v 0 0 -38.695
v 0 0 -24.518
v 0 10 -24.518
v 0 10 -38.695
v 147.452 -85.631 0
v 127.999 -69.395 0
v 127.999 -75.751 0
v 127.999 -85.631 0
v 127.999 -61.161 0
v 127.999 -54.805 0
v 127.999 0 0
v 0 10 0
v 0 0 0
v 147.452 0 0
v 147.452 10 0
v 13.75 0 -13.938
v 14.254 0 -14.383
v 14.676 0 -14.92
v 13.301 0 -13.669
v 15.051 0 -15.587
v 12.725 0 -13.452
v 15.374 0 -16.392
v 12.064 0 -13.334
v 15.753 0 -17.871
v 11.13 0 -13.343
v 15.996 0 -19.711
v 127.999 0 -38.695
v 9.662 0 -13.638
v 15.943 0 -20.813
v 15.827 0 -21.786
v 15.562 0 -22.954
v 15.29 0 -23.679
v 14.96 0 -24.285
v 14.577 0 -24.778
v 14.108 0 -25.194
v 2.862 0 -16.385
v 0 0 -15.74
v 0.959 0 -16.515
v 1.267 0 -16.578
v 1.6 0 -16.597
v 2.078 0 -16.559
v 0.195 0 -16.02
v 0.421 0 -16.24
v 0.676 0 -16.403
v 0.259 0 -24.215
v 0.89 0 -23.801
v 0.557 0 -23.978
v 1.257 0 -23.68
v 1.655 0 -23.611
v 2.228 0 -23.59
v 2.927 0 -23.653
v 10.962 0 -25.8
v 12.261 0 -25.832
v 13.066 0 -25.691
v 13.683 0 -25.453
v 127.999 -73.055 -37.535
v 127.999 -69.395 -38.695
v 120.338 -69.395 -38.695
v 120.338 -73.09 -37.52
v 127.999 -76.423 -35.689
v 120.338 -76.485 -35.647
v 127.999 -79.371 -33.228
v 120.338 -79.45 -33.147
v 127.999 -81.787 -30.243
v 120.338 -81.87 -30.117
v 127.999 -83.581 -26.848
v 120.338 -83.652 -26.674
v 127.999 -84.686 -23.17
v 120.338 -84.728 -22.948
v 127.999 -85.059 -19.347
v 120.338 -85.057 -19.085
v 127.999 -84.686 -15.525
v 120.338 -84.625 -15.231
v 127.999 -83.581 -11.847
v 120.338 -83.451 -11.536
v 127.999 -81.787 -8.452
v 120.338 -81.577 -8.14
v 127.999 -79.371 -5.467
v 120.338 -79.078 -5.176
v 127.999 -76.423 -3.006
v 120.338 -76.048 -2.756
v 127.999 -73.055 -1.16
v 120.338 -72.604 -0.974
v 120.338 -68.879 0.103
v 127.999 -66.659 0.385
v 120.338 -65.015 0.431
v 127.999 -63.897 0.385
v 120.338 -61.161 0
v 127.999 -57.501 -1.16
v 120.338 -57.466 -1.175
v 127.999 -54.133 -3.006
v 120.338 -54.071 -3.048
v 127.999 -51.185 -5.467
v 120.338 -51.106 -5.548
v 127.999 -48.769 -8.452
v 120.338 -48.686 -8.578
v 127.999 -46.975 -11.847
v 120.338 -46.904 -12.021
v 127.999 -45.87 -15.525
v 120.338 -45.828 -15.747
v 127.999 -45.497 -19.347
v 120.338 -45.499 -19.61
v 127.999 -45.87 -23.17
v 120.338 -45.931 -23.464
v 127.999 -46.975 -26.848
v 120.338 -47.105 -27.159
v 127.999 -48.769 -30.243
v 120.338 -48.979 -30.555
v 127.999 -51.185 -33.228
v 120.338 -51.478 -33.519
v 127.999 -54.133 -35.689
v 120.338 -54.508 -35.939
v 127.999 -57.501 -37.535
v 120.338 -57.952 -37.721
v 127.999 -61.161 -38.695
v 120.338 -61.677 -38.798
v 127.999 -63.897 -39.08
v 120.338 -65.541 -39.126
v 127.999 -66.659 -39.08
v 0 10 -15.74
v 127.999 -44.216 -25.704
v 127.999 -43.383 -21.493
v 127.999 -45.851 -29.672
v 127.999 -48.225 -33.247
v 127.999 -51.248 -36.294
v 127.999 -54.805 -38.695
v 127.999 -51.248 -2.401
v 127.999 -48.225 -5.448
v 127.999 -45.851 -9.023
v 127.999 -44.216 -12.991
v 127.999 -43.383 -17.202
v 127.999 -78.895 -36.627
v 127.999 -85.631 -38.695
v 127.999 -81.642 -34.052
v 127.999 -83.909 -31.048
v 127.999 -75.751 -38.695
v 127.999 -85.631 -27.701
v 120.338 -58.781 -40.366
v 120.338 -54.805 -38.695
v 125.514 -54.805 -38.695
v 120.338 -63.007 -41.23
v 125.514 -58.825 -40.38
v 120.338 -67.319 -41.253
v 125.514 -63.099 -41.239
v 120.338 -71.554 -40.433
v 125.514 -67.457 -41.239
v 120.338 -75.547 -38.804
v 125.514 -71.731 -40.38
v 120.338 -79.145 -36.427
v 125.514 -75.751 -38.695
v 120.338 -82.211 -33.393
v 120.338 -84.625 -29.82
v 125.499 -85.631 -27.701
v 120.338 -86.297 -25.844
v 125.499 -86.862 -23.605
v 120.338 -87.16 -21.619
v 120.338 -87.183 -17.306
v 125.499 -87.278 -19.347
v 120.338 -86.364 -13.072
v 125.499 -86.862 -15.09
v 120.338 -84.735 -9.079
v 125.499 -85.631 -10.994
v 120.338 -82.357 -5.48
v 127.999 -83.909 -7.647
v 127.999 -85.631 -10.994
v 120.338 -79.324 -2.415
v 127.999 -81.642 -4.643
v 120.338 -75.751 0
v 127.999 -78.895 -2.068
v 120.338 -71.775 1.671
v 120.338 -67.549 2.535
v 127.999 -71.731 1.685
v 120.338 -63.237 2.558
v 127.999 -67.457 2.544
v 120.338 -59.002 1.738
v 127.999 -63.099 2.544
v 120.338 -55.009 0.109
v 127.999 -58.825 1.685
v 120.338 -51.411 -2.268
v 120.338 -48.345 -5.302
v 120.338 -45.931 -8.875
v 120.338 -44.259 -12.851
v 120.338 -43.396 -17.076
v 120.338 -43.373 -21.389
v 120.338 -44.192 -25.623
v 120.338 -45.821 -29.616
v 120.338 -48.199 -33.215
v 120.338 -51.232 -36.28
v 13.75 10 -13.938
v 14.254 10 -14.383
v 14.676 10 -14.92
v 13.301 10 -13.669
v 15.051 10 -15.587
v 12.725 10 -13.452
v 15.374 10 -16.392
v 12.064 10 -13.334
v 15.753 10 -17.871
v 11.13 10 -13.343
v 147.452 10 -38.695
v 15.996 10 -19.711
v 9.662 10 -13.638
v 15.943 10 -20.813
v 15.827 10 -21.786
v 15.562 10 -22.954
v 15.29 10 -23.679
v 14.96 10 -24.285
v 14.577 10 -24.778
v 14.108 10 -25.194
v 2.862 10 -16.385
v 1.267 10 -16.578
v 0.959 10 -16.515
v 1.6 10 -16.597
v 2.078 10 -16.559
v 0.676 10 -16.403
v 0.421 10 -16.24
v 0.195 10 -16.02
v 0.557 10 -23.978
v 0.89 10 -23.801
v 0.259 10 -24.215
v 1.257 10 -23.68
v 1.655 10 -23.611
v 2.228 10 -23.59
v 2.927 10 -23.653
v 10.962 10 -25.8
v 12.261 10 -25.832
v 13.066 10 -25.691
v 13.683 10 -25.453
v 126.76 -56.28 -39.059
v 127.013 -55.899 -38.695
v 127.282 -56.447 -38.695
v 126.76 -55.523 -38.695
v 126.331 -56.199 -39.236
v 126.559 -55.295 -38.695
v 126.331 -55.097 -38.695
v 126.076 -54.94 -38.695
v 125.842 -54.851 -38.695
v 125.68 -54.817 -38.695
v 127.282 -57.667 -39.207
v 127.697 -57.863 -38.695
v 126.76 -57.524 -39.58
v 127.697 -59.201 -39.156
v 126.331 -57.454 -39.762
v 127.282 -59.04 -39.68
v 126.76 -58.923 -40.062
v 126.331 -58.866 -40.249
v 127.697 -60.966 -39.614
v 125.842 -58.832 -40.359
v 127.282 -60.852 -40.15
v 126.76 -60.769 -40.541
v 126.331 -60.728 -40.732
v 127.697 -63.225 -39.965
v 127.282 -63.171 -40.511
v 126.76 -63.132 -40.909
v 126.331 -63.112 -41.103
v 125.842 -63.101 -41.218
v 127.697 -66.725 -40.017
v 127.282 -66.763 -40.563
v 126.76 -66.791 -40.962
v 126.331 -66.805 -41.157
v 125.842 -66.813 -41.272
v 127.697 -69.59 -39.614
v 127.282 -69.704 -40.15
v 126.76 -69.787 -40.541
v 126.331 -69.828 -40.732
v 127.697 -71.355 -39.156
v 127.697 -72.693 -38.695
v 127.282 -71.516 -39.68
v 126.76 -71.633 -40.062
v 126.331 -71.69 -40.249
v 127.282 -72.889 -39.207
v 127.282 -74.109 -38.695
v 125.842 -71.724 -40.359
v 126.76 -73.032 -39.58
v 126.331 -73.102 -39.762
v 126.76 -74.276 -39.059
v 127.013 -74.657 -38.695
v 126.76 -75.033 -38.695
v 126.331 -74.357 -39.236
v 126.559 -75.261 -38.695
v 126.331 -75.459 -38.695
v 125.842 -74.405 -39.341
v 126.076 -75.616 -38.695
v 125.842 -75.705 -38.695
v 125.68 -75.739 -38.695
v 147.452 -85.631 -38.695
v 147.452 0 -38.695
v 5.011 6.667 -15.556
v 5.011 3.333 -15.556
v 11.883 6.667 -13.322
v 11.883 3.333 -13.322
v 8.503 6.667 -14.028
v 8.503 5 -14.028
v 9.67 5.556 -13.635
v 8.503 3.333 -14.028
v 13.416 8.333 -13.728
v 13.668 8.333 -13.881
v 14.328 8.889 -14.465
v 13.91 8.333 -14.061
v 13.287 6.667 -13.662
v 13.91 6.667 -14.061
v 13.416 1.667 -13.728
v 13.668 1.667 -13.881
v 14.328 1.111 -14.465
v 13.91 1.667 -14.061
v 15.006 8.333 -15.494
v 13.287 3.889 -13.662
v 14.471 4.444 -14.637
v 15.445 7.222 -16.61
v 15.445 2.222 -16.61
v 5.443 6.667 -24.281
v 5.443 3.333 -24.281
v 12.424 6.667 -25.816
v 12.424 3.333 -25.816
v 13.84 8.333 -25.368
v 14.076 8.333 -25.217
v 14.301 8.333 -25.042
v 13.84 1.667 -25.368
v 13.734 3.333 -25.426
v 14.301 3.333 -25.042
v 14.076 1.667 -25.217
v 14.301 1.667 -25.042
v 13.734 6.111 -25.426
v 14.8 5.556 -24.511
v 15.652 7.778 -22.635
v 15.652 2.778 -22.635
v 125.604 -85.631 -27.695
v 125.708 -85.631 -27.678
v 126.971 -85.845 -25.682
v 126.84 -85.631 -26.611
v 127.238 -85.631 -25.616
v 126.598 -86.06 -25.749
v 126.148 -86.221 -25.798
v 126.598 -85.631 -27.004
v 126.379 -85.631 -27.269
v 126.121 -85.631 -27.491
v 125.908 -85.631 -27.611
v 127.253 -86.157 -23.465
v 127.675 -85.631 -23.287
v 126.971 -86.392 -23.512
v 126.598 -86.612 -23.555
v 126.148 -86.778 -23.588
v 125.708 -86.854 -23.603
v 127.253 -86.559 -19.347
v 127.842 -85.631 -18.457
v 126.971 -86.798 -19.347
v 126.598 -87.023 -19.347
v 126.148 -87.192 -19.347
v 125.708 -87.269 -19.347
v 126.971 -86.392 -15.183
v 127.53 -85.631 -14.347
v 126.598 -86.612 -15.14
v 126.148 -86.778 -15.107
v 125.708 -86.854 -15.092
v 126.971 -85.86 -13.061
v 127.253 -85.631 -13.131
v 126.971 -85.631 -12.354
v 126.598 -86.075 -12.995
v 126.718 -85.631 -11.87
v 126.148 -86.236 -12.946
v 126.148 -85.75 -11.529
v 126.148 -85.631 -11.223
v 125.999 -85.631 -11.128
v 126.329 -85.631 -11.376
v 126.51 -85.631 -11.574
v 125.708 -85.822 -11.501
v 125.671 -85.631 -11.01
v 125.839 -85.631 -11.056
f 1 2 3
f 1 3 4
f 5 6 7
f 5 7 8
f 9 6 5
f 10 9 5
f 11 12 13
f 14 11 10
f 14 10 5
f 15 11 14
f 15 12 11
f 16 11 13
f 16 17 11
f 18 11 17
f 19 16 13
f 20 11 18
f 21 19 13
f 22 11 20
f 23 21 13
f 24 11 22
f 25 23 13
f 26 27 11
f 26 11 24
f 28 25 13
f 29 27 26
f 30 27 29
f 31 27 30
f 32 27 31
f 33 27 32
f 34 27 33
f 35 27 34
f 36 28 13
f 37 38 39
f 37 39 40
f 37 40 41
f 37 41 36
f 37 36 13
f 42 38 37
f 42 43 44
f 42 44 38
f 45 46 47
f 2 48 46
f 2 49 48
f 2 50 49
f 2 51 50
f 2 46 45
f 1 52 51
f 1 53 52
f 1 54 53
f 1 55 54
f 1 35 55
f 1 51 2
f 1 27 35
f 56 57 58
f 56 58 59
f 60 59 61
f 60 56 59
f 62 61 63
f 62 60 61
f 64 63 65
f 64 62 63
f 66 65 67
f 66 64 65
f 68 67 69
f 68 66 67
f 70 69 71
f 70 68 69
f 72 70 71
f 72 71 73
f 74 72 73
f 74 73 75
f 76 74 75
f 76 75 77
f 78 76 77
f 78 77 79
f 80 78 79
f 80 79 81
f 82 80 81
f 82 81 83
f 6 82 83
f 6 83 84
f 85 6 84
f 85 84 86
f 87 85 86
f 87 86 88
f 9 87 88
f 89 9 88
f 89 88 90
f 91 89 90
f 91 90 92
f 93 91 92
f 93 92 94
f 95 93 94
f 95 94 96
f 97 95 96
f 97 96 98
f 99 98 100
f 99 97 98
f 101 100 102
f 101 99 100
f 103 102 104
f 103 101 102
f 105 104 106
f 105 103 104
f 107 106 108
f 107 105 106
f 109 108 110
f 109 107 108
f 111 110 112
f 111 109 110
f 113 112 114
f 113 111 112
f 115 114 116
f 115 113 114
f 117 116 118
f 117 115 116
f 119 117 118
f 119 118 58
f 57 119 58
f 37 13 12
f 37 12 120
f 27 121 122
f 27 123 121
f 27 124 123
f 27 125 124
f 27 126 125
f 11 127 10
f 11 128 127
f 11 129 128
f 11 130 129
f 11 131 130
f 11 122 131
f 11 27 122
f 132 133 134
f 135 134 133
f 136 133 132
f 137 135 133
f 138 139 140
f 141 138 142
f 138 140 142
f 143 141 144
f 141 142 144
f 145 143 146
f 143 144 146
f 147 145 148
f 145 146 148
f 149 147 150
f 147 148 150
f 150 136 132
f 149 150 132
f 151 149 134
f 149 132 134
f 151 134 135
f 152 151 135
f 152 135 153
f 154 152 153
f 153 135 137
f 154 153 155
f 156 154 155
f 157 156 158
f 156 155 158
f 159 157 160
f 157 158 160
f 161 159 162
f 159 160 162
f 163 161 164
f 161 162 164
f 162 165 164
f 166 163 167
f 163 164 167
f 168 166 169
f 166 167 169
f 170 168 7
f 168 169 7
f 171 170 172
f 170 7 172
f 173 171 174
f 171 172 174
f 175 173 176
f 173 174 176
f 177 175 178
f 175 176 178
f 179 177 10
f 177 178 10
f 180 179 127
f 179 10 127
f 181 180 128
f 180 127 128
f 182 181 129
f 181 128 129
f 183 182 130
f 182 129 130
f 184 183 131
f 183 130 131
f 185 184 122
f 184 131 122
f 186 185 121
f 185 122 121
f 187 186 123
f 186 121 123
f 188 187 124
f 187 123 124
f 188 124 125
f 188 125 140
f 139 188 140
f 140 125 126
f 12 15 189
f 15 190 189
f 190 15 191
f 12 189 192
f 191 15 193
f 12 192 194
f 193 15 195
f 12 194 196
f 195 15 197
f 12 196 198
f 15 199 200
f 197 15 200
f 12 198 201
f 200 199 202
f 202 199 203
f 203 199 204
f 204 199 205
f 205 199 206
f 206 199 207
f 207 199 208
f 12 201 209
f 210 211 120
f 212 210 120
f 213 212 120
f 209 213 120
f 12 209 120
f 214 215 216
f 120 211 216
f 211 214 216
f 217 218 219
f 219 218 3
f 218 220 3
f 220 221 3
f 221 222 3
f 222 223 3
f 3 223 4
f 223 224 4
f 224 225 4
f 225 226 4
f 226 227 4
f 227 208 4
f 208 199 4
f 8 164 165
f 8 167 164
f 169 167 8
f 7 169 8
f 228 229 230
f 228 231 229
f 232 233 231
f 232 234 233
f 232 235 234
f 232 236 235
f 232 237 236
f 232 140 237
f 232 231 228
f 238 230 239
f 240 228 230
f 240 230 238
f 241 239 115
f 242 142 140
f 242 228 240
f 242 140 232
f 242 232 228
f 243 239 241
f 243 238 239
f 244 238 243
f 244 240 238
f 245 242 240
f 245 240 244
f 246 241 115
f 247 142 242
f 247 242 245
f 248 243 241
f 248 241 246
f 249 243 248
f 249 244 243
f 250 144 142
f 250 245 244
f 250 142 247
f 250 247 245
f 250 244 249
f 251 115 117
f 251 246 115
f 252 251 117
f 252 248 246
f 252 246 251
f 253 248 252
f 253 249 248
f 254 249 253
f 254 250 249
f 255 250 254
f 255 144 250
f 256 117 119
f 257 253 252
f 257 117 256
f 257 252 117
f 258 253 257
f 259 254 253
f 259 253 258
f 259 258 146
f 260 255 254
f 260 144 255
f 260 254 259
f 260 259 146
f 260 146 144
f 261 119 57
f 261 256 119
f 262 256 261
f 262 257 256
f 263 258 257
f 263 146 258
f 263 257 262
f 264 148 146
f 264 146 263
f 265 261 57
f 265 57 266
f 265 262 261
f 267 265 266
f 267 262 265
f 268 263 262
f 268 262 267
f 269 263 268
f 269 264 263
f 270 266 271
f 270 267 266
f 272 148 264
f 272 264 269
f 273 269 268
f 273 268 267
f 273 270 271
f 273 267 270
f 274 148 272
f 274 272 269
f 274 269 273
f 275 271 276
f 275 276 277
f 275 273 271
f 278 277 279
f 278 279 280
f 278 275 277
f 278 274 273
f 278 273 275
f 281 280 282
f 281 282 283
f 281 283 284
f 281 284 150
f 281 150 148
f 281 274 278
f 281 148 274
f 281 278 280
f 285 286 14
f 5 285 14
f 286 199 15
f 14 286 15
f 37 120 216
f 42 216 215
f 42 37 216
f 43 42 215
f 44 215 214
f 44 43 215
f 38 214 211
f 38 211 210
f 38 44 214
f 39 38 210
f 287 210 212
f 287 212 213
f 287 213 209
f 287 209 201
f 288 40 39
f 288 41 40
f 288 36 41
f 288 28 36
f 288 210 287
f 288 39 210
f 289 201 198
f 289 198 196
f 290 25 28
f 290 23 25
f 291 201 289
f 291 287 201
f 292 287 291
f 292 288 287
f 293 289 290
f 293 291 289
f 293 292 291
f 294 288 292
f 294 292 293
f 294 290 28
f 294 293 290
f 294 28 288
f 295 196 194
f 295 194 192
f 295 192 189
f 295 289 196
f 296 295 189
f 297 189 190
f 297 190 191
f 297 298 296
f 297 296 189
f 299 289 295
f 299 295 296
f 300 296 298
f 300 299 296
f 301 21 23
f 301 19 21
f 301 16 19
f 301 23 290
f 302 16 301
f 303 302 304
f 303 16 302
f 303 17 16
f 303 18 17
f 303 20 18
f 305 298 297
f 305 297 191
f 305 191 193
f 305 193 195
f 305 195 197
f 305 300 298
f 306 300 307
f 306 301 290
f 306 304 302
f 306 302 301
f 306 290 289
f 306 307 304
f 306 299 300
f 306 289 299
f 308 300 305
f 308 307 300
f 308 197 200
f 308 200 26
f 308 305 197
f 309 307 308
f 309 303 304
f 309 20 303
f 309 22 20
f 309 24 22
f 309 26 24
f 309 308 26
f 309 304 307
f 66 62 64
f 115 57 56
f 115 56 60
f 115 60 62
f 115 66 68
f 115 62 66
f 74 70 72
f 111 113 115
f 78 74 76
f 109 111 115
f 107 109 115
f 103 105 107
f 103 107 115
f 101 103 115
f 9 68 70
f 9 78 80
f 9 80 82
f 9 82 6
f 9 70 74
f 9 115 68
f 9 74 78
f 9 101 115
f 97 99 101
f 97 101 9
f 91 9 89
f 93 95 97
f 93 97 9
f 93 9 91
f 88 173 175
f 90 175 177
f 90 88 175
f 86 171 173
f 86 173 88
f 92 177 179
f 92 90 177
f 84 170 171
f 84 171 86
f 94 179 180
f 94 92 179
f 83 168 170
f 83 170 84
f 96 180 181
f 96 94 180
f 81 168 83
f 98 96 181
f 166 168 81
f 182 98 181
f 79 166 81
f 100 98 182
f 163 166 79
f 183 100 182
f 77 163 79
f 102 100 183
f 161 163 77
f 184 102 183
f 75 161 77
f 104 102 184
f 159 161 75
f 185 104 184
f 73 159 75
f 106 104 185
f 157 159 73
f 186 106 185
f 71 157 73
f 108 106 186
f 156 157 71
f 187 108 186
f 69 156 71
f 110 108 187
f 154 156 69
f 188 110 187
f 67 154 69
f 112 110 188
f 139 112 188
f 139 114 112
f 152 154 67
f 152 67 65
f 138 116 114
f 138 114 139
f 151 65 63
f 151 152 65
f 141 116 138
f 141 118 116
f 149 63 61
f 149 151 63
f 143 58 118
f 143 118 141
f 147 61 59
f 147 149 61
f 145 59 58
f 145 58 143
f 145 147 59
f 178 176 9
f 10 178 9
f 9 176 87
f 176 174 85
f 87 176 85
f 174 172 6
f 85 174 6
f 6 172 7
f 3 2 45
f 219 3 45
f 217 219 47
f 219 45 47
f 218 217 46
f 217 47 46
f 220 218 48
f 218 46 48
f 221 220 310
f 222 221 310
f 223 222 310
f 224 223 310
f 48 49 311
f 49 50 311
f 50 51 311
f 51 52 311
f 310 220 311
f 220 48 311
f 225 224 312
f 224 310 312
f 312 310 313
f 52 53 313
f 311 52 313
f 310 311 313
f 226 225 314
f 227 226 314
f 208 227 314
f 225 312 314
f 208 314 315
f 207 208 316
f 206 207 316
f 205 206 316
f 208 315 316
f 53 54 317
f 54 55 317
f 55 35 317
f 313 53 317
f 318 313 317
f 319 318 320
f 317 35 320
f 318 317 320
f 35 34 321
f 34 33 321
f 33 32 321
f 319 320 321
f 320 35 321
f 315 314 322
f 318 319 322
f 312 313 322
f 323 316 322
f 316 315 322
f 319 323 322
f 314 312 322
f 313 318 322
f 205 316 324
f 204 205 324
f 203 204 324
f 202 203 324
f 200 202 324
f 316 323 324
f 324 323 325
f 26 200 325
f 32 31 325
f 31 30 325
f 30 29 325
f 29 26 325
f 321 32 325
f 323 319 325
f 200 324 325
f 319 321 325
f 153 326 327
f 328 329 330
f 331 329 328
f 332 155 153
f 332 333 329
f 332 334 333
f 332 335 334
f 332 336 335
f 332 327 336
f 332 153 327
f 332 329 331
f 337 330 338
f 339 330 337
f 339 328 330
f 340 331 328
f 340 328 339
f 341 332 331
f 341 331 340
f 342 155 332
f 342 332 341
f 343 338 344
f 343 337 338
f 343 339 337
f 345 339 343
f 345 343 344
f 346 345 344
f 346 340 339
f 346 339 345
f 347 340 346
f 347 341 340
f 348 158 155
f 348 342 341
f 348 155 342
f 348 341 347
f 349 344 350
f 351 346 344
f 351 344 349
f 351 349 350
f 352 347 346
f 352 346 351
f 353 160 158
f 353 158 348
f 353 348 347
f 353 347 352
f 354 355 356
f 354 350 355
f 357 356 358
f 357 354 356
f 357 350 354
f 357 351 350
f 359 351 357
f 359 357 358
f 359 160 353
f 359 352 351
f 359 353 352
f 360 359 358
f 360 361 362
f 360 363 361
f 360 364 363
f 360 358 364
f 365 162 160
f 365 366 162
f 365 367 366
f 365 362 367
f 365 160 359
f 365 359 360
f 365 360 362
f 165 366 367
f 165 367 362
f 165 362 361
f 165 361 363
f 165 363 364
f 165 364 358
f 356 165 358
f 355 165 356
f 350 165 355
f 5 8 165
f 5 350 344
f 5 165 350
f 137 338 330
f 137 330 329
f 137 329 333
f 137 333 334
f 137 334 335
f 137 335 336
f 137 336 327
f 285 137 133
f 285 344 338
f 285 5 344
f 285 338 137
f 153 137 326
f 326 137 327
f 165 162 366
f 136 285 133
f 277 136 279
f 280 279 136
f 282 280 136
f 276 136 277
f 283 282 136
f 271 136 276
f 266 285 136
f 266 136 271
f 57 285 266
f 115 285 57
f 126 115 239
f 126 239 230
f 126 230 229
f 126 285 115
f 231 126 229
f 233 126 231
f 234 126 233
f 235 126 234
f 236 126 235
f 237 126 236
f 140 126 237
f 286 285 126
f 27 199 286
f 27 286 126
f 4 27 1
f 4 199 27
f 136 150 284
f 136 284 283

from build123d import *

# Parameters (mm, degrees)
BOSS_EXTRUDE1_DEPTH = 10
SKETCH5_W           = 19.453021512
SKETCH5_H           = 38.694970839
BOSS_EXTRUDE2_DEPTH = 85.63051792
SKETCH6_R           = 22
SKETCH6_R_2         = 19.780571117
BOSS_EXTRUDE5_DEPTH = 7.660427645
FILLET10_R          = 2.5
FILLET11_R          = 2.5


with BuildPart() as part:
    # Sketch1 → Boss-Extrude1 (new body)
    with BuildSketch(Plane(origin=(0, 0, 0), x_dir=(1, 0, 0), z_dir=(0, 1, 0))):
        with BuildLine():
            Line((0, 24.518151768), (0, 38.694970839))
            Line((0, 38.694970839), (147.451699193, 38.694970839))
            Line((147.451699193, 38.694970839), (147.451699193, 0))
            Line((147.451699193, 0), (0, 0))
            Line((0, 0), (0, 15.74024552))
            add(Edge.make_bspline(
                [(0, 15.74024552), (2.540846011, 20.138217128), (14.801575787, 5.452312854), (15.995670115, 19.711234682)],
                knots=[0, 0, 0, 0, 1, 1, 1, 1], degree=3))
            add(Edge.make_bspline(
                [(0, 24.518151768), (3.025411482, 20.257839716), (15.777331359, 32.77346932), (15.995670115, 19.711234682)],
                knots=[0, 0, 0, 0, 1, 1, 1, 1], degree=3))
        make_face()
    extrude(amount=BOSS_EXTRUDE1_DEPTH)

    # Sketch5 → Boss-Extrude2 (add)
    with BuildSketch(Plane.XZ):
        with Locations((137.725188437, -19.347485419)):
            Rectangle(SKETCH5_W, SKETCH5_H)
    extrude(amount=BOSS_EXTRUDE2_DEPTH)

    # Sketch6 → Boss-Extrude5 (add)
    with BuildSketch(Plane.ZY.offset(-127.998677681)):
        with Locations(Location((-19.34748542, -65.278, 0), (0, 0, 151.573820003))):
            Circle(SKETCH6_R)
        with Locations(Location((-19.34748542, -65.278, 0), (0, 0, 192.011596254))):
            Circle(SKETCH6_R_2, mode=Mode.SUBTRACT)
    extrude(amount=BOSS_EXTRUDE5_DEPTH)

    # Fillet10
    # the kernel refuses this fillet: 2.5 mm, written as the material it takes off along each edge
    with BuildSketch(Plane(origin=(127.998677681, -65.278, -19.34748542), x_dir=(0, 0.7021921970481064, -0.711987442589231), z_dir=(0, 0.711987442589231, 0.7021921970481064))) as fillet10_piece_1_section:
        with BuildLine():
            CenterArc((19.5, 2.48420608), FILLET10_R, 276.443791757, 83.556208243)
            Line((22, 2.48420608), (22, 0))
            Line((22, 0), (19.780571117, 0))
        make_face()
    fillet10_piece_1 = revolve(axis=Axis((127.998677681, -65.278, -19.34748542), (-1, 0, 0)), revolution_arc=89.20629991, mode=Mode.PRIVATE)
    fillet10_piece_1 = split(fillet10_piece_1, bisect_by=Plane(origin=(127.183421673, -65.278, -38.694970839), z_dir=(0, 0, -1)), keep=Keep.TOP, mode=Mode.PRIVATE)
    add(fillet10_piece_1, mode=Mode.SUBTRACT)

    # Fillet11
    # the kernel refuses this fillet: 2.5 mm, written as the material it takes off along each edge
    with BuildSketch(Plane(origin=(127.998677681, -65.278, -19.34748542), x_dir=(0, -0.7815945319539552, -0.6237868126368795), z_dir=(0, 0.6237868126368795, -0.7815945319539552))) as fillet11_piece_1_section:
        with BuildLine():
            CenterArc((22 - FILLET11_R, FILLET11_R), FILLET11_R, 270, 90)
            Line((22, FILLET11_R), (22, 0))
            Line((22, 0), (22 - FILLET11_R, 0))
        make_face()
    fillet11_piece_1 = revolve(axis=Axis((127.998677681, -65.278, -19.34748542), (-1, 0, 0)), revolution_arc=77.186396047, mode=Mode.PRIVATE)
    fillet11_piece_1 = split(fillet11_piece_1, bisect_by=Plane(origin=(127.364659544, -85.63051792, -19.347486624), z_dir=(0, -1, 0)), keep=Keep.TOP, mode=Mode.PRIVATE)
    add(fillet11_piece_1, mode=Mode.SUBTRACT)


solid = part.part
